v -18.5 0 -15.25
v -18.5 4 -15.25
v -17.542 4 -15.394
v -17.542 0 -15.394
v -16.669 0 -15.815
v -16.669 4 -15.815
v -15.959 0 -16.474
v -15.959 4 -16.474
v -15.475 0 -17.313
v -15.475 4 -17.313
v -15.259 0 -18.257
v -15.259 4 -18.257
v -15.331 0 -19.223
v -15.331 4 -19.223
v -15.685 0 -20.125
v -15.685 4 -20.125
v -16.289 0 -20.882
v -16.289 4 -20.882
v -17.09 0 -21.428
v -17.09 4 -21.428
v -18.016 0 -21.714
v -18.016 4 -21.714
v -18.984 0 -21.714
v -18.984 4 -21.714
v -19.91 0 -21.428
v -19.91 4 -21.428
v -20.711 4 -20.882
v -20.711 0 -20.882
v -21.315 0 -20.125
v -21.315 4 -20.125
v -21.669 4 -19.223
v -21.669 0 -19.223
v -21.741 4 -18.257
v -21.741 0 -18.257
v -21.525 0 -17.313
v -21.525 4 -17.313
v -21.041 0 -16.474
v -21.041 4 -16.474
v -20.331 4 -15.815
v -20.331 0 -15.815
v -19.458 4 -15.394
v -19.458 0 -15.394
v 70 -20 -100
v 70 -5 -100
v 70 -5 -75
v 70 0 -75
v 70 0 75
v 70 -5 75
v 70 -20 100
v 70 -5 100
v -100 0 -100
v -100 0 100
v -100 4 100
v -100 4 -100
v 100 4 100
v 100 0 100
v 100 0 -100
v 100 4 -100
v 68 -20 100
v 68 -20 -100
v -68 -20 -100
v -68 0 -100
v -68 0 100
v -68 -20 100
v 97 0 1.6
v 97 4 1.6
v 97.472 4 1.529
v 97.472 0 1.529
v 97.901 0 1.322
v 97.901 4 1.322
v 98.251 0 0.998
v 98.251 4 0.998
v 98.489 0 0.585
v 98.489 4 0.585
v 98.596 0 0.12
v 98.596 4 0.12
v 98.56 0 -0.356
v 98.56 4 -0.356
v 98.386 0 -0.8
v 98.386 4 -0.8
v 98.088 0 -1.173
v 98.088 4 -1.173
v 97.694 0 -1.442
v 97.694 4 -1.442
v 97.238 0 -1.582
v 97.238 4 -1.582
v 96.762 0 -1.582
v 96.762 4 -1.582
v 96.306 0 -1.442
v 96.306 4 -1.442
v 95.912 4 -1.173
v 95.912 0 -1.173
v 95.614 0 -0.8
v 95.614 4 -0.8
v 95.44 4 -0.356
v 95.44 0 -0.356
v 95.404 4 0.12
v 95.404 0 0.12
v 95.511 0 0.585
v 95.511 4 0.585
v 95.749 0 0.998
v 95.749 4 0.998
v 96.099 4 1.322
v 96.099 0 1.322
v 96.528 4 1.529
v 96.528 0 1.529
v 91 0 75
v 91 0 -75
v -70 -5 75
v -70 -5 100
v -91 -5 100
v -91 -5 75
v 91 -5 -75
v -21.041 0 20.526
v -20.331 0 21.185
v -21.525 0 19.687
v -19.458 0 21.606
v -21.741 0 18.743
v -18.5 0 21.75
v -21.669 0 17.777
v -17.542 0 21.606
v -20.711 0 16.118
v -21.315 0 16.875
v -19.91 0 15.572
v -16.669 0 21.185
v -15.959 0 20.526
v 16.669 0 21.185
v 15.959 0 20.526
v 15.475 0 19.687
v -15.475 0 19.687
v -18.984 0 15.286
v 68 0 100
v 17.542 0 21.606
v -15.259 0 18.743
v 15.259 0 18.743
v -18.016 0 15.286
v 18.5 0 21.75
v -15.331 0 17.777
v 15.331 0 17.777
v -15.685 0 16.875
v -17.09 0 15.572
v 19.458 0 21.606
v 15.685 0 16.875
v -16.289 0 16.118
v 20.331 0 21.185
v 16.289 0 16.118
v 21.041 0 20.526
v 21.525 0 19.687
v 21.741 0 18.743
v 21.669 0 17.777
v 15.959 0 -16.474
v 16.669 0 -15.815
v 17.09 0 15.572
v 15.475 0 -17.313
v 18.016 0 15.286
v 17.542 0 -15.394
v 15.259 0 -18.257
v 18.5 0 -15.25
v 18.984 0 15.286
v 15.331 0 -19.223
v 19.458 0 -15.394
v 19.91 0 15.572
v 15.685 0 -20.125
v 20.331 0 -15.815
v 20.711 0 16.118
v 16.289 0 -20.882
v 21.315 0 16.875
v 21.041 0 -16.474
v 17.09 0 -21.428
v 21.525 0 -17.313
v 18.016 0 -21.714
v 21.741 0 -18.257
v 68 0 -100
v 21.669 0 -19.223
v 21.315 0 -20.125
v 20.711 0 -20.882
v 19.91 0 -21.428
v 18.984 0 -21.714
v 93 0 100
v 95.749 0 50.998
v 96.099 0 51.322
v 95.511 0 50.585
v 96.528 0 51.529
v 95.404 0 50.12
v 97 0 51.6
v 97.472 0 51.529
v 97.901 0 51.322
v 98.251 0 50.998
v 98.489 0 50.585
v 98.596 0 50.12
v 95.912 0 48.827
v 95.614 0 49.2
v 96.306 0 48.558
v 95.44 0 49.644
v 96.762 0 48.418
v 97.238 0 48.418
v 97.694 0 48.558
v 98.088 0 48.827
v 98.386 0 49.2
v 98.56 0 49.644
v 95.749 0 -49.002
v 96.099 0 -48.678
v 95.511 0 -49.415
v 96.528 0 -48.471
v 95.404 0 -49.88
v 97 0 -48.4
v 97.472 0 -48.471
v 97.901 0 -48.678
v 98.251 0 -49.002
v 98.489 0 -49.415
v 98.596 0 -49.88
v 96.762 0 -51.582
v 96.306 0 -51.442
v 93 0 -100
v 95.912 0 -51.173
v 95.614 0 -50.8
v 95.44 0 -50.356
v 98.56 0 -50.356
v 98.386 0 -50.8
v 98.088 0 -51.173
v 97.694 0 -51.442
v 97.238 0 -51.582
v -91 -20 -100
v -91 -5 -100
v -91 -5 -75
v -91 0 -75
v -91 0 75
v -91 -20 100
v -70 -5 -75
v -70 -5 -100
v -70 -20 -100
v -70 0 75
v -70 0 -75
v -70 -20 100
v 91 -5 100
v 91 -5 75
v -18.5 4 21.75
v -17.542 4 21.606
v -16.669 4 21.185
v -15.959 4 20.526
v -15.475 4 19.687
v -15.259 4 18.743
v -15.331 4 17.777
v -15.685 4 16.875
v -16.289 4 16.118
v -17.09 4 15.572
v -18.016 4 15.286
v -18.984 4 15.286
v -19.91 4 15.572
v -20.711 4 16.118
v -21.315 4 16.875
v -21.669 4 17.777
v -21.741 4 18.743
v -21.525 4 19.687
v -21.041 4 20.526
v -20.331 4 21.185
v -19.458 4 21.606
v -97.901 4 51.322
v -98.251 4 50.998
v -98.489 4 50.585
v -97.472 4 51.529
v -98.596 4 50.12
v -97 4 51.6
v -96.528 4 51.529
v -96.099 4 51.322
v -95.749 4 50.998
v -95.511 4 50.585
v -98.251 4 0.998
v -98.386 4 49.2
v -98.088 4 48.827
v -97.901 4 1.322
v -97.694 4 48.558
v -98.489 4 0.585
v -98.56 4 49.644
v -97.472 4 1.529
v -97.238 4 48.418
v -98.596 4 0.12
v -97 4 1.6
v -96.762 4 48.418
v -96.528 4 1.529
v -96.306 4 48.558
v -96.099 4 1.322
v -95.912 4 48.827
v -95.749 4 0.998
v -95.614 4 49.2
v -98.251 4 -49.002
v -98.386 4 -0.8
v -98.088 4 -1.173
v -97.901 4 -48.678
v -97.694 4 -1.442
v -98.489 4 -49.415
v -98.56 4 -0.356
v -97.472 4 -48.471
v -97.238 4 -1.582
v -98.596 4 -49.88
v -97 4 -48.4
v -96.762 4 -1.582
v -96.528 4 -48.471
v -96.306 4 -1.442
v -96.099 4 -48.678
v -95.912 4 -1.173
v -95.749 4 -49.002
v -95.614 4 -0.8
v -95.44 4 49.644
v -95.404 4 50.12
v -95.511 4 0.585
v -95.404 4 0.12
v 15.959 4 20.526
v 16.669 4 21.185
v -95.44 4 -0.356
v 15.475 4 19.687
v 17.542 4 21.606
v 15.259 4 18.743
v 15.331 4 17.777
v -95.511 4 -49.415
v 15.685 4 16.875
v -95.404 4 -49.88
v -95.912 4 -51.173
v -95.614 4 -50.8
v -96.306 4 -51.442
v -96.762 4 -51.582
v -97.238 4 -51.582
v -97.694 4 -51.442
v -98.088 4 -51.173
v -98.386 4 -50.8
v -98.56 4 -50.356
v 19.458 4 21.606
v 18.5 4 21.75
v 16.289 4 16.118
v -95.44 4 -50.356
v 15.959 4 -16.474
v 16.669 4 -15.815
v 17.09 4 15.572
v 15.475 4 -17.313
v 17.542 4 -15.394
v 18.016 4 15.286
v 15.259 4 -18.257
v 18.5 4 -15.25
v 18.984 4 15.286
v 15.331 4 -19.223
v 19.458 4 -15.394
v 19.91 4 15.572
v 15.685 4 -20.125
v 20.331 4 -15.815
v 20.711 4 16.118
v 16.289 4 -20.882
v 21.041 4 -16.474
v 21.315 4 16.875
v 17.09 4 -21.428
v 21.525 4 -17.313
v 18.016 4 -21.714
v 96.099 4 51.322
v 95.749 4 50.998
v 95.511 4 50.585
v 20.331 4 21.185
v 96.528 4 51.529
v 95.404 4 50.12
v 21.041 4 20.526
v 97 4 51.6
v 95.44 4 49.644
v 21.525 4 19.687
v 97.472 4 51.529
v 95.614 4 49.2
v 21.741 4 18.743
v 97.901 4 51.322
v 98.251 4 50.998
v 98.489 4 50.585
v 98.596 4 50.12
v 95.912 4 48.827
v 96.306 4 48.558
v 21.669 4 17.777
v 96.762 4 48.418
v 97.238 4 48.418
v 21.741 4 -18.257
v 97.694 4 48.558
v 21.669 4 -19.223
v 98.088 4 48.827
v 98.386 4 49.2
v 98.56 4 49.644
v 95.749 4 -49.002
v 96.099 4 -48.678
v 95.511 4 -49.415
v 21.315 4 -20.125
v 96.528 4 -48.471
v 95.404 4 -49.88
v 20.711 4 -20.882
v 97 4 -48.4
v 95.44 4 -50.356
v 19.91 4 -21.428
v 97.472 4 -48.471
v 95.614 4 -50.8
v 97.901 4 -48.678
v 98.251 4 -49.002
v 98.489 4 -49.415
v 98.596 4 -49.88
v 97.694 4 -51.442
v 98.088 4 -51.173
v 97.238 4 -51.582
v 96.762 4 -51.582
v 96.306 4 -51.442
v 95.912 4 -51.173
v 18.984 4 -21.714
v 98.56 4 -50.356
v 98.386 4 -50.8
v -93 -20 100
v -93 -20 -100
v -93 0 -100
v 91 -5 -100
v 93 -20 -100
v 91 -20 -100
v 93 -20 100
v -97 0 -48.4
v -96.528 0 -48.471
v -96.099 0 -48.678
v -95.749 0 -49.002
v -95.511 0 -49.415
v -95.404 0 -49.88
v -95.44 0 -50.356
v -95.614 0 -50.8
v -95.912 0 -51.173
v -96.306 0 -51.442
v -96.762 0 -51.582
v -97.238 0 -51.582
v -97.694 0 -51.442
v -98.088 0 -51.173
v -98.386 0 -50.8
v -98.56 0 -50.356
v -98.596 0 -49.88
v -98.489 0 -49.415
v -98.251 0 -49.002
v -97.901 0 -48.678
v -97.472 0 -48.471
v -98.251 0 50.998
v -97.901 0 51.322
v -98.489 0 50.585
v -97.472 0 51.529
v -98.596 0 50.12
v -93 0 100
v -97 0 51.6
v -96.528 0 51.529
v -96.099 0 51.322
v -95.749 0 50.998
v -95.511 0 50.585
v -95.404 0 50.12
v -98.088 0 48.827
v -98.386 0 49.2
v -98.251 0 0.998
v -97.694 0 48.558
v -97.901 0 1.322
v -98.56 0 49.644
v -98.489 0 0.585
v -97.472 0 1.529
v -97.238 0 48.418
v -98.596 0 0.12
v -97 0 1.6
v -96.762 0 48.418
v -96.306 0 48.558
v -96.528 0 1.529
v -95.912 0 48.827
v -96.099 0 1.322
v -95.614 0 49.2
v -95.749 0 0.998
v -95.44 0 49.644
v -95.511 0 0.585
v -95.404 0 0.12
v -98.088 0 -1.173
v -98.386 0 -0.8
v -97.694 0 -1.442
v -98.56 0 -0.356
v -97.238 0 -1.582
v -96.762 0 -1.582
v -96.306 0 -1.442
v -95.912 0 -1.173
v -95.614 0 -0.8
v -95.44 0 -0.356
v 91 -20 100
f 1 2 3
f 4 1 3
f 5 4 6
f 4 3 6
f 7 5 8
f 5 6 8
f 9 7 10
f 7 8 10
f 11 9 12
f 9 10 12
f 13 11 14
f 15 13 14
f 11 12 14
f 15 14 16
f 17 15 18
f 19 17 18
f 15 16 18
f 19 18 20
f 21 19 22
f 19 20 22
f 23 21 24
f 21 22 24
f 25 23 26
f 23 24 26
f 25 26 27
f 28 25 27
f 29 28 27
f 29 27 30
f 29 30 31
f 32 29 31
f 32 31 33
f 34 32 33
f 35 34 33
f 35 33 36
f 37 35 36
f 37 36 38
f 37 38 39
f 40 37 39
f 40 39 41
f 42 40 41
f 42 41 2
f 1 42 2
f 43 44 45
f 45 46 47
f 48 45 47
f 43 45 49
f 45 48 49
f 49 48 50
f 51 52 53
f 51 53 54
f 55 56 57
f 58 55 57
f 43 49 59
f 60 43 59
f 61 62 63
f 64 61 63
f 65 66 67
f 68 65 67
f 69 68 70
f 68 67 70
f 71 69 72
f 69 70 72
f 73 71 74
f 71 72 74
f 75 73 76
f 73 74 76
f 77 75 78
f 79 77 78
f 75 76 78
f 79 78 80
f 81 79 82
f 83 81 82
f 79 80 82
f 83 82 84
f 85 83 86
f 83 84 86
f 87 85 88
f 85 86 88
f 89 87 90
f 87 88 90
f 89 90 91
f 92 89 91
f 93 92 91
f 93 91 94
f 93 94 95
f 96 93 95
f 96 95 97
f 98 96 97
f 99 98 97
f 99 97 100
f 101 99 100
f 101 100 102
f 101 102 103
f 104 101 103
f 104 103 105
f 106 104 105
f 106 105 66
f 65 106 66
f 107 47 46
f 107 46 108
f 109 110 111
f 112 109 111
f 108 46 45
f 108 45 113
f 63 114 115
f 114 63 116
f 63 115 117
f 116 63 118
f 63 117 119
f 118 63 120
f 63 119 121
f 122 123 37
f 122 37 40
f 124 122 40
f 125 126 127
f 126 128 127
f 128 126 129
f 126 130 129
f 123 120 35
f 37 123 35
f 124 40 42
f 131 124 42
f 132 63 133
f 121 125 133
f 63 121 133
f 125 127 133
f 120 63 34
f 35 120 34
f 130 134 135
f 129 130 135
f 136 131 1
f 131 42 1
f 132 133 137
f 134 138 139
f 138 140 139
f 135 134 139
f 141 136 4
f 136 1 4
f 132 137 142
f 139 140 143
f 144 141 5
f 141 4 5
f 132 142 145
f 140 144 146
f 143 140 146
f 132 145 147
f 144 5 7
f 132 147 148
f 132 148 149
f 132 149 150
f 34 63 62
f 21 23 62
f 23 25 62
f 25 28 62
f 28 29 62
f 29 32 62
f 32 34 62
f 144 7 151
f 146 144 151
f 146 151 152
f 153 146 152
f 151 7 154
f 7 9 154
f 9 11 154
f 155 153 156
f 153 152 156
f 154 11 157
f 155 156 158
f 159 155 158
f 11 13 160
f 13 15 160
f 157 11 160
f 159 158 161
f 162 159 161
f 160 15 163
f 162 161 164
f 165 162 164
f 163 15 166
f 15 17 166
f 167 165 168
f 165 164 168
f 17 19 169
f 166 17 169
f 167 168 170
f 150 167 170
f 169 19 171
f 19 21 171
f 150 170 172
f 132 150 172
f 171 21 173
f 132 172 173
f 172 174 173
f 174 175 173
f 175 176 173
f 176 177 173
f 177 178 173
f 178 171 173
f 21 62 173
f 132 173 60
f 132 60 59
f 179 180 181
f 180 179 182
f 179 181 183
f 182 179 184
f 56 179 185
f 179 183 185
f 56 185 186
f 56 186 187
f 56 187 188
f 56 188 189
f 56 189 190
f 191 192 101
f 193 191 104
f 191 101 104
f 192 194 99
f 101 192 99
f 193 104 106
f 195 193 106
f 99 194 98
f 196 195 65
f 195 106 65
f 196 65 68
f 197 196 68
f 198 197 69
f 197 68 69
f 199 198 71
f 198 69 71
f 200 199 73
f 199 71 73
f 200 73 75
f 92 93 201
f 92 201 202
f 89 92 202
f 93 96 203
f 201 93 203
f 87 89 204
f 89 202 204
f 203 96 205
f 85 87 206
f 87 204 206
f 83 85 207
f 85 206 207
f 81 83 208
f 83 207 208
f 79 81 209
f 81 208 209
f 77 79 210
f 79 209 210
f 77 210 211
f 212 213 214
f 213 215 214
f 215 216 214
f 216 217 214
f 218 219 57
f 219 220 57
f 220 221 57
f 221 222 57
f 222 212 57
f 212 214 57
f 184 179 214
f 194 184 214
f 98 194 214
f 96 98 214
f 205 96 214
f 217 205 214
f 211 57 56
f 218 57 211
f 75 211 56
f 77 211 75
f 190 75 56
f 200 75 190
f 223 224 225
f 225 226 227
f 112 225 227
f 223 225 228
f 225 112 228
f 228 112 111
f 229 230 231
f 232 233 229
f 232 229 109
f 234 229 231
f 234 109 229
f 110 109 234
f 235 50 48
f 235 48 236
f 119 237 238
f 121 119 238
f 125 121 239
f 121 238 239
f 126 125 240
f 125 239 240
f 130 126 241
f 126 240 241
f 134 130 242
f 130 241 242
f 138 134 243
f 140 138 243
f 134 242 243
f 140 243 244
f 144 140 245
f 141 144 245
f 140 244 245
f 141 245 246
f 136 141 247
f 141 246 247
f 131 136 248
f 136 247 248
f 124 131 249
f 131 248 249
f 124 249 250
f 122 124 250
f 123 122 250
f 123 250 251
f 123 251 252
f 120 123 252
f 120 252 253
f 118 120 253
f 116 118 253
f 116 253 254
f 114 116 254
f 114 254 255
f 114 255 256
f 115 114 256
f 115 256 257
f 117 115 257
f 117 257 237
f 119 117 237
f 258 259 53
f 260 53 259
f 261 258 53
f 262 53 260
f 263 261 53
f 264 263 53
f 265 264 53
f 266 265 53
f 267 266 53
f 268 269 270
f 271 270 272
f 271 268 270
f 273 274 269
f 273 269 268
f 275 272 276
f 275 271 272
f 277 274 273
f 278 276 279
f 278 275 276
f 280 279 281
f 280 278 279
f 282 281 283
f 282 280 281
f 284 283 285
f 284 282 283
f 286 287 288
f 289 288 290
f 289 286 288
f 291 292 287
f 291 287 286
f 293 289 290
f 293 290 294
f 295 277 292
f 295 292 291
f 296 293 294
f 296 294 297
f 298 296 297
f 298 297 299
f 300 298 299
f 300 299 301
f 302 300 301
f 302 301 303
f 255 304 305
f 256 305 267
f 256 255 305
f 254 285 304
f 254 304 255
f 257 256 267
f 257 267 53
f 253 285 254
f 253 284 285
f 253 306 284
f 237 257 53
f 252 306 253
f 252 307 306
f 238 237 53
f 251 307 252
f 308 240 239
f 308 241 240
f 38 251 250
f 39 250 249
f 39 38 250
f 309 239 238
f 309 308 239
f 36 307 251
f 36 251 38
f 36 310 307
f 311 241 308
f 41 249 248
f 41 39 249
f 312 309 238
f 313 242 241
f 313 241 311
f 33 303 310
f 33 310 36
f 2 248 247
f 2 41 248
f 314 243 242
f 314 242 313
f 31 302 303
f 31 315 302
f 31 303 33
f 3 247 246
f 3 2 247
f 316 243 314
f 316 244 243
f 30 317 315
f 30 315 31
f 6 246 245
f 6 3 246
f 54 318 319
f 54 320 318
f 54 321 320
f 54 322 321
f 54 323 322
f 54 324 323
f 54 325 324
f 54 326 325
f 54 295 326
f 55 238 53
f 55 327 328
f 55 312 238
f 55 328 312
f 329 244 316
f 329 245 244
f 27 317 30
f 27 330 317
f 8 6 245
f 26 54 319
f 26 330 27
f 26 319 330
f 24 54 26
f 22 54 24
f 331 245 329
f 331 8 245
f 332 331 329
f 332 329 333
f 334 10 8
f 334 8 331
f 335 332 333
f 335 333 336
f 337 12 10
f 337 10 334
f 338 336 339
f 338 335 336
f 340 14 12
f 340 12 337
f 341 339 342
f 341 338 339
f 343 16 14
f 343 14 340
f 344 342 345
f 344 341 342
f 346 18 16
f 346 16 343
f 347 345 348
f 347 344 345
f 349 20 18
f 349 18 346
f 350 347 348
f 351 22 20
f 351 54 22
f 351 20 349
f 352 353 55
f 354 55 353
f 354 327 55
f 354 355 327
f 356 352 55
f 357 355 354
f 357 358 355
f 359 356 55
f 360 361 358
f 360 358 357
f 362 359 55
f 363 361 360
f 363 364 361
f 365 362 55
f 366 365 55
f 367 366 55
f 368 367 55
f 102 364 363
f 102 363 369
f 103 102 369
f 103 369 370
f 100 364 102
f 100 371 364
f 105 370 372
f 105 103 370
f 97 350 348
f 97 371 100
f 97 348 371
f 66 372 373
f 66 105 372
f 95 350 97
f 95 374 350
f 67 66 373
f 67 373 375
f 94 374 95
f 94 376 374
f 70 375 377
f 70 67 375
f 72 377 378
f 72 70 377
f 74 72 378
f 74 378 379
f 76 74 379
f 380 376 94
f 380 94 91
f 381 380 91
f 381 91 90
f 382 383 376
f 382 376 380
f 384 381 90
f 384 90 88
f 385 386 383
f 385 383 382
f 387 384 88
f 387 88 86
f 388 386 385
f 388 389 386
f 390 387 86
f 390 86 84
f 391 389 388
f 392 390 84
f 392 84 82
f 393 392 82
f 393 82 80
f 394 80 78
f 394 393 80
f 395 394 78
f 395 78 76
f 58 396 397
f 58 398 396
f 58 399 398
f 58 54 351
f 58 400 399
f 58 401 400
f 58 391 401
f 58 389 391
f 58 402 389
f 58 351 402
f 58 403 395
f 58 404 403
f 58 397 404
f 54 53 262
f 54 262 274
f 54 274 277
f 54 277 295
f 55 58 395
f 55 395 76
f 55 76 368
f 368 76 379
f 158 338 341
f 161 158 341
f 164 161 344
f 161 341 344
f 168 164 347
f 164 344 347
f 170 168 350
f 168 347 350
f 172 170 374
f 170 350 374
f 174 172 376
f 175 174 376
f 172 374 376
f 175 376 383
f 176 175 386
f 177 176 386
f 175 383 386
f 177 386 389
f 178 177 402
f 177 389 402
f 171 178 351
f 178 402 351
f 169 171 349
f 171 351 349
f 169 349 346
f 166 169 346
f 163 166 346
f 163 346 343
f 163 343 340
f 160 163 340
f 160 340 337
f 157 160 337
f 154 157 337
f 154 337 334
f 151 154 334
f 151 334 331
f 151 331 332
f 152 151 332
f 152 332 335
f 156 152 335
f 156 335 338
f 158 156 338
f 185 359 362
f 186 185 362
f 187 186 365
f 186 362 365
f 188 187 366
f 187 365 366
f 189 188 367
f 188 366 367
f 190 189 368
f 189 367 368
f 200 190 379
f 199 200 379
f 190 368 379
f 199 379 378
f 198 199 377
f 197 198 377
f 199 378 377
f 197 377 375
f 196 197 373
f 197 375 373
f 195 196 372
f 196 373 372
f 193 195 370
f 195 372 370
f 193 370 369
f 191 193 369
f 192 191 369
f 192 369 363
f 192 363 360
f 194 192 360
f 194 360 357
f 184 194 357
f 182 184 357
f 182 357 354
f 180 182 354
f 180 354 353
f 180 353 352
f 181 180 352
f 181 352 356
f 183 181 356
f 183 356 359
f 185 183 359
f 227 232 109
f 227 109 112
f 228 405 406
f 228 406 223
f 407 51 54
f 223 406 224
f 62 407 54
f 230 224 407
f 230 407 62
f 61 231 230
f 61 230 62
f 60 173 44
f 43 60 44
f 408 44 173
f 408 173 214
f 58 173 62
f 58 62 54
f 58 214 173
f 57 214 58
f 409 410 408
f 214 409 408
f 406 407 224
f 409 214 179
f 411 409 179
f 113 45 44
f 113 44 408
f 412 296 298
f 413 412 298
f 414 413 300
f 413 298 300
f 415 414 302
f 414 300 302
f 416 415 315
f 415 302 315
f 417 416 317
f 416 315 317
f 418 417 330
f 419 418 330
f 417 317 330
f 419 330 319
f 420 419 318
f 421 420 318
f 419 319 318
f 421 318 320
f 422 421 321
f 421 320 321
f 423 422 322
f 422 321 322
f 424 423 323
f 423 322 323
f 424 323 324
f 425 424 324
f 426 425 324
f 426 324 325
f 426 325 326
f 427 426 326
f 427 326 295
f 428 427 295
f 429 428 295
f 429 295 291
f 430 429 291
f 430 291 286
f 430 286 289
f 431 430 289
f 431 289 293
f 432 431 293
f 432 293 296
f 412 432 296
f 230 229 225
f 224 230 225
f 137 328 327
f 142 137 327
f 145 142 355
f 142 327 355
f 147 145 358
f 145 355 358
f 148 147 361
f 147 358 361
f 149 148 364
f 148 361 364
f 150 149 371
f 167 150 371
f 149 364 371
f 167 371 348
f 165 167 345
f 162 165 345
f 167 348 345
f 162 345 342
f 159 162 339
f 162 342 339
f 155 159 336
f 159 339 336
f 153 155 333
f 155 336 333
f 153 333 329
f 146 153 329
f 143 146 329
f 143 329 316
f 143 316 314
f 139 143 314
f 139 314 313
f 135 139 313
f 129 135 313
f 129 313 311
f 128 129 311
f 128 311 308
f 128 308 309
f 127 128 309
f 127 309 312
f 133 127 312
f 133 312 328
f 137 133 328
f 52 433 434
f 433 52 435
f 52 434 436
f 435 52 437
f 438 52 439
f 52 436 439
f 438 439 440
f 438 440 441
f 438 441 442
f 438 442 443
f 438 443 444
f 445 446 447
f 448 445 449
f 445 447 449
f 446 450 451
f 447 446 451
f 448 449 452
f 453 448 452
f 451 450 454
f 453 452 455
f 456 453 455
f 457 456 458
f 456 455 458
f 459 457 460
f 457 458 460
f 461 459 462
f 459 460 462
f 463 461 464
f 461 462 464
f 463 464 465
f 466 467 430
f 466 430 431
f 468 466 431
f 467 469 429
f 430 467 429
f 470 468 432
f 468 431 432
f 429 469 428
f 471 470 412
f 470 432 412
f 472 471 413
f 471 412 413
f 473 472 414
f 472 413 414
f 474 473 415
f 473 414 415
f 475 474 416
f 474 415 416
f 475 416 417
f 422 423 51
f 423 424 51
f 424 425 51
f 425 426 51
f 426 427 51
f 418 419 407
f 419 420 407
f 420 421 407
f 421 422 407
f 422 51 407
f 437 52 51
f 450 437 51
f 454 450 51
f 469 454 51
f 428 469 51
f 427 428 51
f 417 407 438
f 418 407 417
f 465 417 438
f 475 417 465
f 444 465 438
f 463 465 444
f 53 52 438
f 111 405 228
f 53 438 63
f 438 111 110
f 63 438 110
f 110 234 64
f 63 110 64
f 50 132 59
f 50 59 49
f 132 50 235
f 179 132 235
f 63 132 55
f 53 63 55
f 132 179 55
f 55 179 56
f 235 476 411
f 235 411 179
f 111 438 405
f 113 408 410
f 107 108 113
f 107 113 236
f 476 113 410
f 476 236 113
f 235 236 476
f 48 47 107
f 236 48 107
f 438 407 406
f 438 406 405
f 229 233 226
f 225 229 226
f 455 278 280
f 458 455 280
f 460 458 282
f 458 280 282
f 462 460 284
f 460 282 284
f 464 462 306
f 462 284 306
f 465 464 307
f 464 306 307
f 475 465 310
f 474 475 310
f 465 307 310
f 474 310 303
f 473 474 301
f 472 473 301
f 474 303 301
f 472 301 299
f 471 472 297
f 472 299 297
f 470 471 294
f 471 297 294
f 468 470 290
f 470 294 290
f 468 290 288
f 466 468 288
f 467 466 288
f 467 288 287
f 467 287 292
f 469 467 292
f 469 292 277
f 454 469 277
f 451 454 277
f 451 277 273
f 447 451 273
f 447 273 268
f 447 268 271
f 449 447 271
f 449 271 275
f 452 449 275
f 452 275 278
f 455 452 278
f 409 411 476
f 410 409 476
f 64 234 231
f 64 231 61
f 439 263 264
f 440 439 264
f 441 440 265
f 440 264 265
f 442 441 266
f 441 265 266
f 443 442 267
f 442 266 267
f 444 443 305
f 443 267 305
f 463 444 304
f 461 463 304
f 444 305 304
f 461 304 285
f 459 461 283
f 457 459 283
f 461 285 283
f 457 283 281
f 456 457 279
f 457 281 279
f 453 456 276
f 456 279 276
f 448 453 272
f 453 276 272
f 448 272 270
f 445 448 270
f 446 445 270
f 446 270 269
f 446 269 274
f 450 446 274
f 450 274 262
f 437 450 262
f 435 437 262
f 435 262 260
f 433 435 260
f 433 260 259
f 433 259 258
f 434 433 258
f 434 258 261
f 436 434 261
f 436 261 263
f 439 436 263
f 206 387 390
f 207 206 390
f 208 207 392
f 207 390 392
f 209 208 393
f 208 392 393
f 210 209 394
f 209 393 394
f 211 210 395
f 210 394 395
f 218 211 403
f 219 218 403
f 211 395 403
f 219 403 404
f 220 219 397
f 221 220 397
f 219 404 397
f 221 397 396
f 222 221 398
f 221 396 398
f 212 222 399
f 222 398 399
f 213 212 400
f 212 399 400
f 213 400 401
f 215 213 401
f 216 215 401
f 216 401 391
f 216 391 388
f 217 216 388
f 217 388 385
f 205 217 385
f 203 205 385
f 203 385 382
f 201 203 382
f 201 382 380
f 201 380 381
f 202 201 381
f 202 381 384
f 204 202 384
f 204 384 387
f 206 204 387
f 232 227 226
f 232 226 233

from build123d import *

# Parameters (mm, degrees)
SKETCH_1_W          = 200
SKETCH_1_H          = 200
EXTRUDE_1_DEPTH     = 4
SKETCH_2_W          = 2
SKETCH_2_H          = 200
EXTRUDE_2_DEPTH     = 20
SKETCH_4_R          = 3.25
SKETCH_4_R_2        = 1.6
CUT_EXTRUDE_1_DEPTH = 10
SKETCH_5_W          = 21
SKETCH_5_H          = 25
EXTRUDE_3_DEPTH     = 5


with BuildPart() as part:
    # 草图1 → 凸台-拉伸1 (new body)
    with BuildSketch(Plane(origin=(0, 0, 0), x_dir=(1, 0, 0), z_dir=(0, 1, 0))):
        Rectangle(SKETCH_1_W, SKETCH_1_H)
    extrude(amount=EXTRUDE_1_DEPTH)

    # 草图2 → 凸台-拉伸2 (add)
    with BuildSketch(Plane.XZ):
        with Locations((-69, 0)):
            Rectangle(SKETCH_2_W, SKETCH_2_H)
        with Locations((-92, 0)):
            Rectangle(SKETCH_2_W, SKETCH_2_H)
    extrude_2 = extrude(amount=EXTRUDE_2_DEPTH)

    # 镜向1: 凸台-拉伸2 across plane
    add(extrude_2.mirror(Plane(origin=(0, 0, 0), x_dir=(0, 0, 1), z_dir=(1, 0, 0))))

    # 草图4 → 切除-拉伸1 (cut)
    with BuildSketch(Plane(origin=(0, 4, 0), x_dir=(1, 0, 0), z_dir=(0, 1, 0))):
        with Locations(Location((18.5, 18.5, 0), (0, 0, 270))):
            Circle(SKETCH_4_R)
        with Locations(Location((18.5, -18.5, 0), (0, 0, 270))):
            Circle(SKETCH_4_R)
        with Locations(Location((-18.5, -18.5, 0), (0, 0, 270))):
            Circle(SKETCH_4_R)
        with Locations(Location((-18.5, 18.5, 0), (0, 0, 270))):
            Circle(SKETCH_4_R)
        with Locations(Location((97, -50, 0), (0, 0, 270))):
            Circle(SKETCH_4_R_2)
        with Locations(Location((97, 50, 0), (0, 0, 270))):
            Circle(SKETCH_4_R_2)
        with Locations(Location((-97, -50, 0), (0, 0, 270))):
            Circle(SKETCH_4_R_2)
        with Locations(Location((-97, 50, 0), (0, 0, 270))):
            Circle(SKETCH_4_R_2)
        with Locations(Location((-97, 0, 0), (0, 0, 270))):
            Circle(SKETCH_4_R_2)
        with Locations(Location((97, 0, 0), (0, 0, 270))):
            Circle(SKETCH_4_R_2)
    extrude(amount=-CUT_EXTRUDE_1_DEPTH, mode=Mode.SUBTRACT)

    # 草图5 → 凸台-拉伸3 (add)
    with BuildSketch(Plane.XZ):
        with Locations((80.5, 87.5)):
            Rectangle(SKETCH_5_W, SKETCH_5_H)
        with Locations((80.5, -87.5)):
            Rectangle(SKETCH_5_W, SKETCH_5_H)
    extrude_3 = extrude(amount=EXTRUDE_3_DEPTH)

    # 镜向2: 凸台-拉伸3 across plane
    add(extrude_3.mirror(Plane(origin=(0, 0, 0), x_dir=(0, 0, 1), z_dir=(1, 0, 0))))


solid = part.part
